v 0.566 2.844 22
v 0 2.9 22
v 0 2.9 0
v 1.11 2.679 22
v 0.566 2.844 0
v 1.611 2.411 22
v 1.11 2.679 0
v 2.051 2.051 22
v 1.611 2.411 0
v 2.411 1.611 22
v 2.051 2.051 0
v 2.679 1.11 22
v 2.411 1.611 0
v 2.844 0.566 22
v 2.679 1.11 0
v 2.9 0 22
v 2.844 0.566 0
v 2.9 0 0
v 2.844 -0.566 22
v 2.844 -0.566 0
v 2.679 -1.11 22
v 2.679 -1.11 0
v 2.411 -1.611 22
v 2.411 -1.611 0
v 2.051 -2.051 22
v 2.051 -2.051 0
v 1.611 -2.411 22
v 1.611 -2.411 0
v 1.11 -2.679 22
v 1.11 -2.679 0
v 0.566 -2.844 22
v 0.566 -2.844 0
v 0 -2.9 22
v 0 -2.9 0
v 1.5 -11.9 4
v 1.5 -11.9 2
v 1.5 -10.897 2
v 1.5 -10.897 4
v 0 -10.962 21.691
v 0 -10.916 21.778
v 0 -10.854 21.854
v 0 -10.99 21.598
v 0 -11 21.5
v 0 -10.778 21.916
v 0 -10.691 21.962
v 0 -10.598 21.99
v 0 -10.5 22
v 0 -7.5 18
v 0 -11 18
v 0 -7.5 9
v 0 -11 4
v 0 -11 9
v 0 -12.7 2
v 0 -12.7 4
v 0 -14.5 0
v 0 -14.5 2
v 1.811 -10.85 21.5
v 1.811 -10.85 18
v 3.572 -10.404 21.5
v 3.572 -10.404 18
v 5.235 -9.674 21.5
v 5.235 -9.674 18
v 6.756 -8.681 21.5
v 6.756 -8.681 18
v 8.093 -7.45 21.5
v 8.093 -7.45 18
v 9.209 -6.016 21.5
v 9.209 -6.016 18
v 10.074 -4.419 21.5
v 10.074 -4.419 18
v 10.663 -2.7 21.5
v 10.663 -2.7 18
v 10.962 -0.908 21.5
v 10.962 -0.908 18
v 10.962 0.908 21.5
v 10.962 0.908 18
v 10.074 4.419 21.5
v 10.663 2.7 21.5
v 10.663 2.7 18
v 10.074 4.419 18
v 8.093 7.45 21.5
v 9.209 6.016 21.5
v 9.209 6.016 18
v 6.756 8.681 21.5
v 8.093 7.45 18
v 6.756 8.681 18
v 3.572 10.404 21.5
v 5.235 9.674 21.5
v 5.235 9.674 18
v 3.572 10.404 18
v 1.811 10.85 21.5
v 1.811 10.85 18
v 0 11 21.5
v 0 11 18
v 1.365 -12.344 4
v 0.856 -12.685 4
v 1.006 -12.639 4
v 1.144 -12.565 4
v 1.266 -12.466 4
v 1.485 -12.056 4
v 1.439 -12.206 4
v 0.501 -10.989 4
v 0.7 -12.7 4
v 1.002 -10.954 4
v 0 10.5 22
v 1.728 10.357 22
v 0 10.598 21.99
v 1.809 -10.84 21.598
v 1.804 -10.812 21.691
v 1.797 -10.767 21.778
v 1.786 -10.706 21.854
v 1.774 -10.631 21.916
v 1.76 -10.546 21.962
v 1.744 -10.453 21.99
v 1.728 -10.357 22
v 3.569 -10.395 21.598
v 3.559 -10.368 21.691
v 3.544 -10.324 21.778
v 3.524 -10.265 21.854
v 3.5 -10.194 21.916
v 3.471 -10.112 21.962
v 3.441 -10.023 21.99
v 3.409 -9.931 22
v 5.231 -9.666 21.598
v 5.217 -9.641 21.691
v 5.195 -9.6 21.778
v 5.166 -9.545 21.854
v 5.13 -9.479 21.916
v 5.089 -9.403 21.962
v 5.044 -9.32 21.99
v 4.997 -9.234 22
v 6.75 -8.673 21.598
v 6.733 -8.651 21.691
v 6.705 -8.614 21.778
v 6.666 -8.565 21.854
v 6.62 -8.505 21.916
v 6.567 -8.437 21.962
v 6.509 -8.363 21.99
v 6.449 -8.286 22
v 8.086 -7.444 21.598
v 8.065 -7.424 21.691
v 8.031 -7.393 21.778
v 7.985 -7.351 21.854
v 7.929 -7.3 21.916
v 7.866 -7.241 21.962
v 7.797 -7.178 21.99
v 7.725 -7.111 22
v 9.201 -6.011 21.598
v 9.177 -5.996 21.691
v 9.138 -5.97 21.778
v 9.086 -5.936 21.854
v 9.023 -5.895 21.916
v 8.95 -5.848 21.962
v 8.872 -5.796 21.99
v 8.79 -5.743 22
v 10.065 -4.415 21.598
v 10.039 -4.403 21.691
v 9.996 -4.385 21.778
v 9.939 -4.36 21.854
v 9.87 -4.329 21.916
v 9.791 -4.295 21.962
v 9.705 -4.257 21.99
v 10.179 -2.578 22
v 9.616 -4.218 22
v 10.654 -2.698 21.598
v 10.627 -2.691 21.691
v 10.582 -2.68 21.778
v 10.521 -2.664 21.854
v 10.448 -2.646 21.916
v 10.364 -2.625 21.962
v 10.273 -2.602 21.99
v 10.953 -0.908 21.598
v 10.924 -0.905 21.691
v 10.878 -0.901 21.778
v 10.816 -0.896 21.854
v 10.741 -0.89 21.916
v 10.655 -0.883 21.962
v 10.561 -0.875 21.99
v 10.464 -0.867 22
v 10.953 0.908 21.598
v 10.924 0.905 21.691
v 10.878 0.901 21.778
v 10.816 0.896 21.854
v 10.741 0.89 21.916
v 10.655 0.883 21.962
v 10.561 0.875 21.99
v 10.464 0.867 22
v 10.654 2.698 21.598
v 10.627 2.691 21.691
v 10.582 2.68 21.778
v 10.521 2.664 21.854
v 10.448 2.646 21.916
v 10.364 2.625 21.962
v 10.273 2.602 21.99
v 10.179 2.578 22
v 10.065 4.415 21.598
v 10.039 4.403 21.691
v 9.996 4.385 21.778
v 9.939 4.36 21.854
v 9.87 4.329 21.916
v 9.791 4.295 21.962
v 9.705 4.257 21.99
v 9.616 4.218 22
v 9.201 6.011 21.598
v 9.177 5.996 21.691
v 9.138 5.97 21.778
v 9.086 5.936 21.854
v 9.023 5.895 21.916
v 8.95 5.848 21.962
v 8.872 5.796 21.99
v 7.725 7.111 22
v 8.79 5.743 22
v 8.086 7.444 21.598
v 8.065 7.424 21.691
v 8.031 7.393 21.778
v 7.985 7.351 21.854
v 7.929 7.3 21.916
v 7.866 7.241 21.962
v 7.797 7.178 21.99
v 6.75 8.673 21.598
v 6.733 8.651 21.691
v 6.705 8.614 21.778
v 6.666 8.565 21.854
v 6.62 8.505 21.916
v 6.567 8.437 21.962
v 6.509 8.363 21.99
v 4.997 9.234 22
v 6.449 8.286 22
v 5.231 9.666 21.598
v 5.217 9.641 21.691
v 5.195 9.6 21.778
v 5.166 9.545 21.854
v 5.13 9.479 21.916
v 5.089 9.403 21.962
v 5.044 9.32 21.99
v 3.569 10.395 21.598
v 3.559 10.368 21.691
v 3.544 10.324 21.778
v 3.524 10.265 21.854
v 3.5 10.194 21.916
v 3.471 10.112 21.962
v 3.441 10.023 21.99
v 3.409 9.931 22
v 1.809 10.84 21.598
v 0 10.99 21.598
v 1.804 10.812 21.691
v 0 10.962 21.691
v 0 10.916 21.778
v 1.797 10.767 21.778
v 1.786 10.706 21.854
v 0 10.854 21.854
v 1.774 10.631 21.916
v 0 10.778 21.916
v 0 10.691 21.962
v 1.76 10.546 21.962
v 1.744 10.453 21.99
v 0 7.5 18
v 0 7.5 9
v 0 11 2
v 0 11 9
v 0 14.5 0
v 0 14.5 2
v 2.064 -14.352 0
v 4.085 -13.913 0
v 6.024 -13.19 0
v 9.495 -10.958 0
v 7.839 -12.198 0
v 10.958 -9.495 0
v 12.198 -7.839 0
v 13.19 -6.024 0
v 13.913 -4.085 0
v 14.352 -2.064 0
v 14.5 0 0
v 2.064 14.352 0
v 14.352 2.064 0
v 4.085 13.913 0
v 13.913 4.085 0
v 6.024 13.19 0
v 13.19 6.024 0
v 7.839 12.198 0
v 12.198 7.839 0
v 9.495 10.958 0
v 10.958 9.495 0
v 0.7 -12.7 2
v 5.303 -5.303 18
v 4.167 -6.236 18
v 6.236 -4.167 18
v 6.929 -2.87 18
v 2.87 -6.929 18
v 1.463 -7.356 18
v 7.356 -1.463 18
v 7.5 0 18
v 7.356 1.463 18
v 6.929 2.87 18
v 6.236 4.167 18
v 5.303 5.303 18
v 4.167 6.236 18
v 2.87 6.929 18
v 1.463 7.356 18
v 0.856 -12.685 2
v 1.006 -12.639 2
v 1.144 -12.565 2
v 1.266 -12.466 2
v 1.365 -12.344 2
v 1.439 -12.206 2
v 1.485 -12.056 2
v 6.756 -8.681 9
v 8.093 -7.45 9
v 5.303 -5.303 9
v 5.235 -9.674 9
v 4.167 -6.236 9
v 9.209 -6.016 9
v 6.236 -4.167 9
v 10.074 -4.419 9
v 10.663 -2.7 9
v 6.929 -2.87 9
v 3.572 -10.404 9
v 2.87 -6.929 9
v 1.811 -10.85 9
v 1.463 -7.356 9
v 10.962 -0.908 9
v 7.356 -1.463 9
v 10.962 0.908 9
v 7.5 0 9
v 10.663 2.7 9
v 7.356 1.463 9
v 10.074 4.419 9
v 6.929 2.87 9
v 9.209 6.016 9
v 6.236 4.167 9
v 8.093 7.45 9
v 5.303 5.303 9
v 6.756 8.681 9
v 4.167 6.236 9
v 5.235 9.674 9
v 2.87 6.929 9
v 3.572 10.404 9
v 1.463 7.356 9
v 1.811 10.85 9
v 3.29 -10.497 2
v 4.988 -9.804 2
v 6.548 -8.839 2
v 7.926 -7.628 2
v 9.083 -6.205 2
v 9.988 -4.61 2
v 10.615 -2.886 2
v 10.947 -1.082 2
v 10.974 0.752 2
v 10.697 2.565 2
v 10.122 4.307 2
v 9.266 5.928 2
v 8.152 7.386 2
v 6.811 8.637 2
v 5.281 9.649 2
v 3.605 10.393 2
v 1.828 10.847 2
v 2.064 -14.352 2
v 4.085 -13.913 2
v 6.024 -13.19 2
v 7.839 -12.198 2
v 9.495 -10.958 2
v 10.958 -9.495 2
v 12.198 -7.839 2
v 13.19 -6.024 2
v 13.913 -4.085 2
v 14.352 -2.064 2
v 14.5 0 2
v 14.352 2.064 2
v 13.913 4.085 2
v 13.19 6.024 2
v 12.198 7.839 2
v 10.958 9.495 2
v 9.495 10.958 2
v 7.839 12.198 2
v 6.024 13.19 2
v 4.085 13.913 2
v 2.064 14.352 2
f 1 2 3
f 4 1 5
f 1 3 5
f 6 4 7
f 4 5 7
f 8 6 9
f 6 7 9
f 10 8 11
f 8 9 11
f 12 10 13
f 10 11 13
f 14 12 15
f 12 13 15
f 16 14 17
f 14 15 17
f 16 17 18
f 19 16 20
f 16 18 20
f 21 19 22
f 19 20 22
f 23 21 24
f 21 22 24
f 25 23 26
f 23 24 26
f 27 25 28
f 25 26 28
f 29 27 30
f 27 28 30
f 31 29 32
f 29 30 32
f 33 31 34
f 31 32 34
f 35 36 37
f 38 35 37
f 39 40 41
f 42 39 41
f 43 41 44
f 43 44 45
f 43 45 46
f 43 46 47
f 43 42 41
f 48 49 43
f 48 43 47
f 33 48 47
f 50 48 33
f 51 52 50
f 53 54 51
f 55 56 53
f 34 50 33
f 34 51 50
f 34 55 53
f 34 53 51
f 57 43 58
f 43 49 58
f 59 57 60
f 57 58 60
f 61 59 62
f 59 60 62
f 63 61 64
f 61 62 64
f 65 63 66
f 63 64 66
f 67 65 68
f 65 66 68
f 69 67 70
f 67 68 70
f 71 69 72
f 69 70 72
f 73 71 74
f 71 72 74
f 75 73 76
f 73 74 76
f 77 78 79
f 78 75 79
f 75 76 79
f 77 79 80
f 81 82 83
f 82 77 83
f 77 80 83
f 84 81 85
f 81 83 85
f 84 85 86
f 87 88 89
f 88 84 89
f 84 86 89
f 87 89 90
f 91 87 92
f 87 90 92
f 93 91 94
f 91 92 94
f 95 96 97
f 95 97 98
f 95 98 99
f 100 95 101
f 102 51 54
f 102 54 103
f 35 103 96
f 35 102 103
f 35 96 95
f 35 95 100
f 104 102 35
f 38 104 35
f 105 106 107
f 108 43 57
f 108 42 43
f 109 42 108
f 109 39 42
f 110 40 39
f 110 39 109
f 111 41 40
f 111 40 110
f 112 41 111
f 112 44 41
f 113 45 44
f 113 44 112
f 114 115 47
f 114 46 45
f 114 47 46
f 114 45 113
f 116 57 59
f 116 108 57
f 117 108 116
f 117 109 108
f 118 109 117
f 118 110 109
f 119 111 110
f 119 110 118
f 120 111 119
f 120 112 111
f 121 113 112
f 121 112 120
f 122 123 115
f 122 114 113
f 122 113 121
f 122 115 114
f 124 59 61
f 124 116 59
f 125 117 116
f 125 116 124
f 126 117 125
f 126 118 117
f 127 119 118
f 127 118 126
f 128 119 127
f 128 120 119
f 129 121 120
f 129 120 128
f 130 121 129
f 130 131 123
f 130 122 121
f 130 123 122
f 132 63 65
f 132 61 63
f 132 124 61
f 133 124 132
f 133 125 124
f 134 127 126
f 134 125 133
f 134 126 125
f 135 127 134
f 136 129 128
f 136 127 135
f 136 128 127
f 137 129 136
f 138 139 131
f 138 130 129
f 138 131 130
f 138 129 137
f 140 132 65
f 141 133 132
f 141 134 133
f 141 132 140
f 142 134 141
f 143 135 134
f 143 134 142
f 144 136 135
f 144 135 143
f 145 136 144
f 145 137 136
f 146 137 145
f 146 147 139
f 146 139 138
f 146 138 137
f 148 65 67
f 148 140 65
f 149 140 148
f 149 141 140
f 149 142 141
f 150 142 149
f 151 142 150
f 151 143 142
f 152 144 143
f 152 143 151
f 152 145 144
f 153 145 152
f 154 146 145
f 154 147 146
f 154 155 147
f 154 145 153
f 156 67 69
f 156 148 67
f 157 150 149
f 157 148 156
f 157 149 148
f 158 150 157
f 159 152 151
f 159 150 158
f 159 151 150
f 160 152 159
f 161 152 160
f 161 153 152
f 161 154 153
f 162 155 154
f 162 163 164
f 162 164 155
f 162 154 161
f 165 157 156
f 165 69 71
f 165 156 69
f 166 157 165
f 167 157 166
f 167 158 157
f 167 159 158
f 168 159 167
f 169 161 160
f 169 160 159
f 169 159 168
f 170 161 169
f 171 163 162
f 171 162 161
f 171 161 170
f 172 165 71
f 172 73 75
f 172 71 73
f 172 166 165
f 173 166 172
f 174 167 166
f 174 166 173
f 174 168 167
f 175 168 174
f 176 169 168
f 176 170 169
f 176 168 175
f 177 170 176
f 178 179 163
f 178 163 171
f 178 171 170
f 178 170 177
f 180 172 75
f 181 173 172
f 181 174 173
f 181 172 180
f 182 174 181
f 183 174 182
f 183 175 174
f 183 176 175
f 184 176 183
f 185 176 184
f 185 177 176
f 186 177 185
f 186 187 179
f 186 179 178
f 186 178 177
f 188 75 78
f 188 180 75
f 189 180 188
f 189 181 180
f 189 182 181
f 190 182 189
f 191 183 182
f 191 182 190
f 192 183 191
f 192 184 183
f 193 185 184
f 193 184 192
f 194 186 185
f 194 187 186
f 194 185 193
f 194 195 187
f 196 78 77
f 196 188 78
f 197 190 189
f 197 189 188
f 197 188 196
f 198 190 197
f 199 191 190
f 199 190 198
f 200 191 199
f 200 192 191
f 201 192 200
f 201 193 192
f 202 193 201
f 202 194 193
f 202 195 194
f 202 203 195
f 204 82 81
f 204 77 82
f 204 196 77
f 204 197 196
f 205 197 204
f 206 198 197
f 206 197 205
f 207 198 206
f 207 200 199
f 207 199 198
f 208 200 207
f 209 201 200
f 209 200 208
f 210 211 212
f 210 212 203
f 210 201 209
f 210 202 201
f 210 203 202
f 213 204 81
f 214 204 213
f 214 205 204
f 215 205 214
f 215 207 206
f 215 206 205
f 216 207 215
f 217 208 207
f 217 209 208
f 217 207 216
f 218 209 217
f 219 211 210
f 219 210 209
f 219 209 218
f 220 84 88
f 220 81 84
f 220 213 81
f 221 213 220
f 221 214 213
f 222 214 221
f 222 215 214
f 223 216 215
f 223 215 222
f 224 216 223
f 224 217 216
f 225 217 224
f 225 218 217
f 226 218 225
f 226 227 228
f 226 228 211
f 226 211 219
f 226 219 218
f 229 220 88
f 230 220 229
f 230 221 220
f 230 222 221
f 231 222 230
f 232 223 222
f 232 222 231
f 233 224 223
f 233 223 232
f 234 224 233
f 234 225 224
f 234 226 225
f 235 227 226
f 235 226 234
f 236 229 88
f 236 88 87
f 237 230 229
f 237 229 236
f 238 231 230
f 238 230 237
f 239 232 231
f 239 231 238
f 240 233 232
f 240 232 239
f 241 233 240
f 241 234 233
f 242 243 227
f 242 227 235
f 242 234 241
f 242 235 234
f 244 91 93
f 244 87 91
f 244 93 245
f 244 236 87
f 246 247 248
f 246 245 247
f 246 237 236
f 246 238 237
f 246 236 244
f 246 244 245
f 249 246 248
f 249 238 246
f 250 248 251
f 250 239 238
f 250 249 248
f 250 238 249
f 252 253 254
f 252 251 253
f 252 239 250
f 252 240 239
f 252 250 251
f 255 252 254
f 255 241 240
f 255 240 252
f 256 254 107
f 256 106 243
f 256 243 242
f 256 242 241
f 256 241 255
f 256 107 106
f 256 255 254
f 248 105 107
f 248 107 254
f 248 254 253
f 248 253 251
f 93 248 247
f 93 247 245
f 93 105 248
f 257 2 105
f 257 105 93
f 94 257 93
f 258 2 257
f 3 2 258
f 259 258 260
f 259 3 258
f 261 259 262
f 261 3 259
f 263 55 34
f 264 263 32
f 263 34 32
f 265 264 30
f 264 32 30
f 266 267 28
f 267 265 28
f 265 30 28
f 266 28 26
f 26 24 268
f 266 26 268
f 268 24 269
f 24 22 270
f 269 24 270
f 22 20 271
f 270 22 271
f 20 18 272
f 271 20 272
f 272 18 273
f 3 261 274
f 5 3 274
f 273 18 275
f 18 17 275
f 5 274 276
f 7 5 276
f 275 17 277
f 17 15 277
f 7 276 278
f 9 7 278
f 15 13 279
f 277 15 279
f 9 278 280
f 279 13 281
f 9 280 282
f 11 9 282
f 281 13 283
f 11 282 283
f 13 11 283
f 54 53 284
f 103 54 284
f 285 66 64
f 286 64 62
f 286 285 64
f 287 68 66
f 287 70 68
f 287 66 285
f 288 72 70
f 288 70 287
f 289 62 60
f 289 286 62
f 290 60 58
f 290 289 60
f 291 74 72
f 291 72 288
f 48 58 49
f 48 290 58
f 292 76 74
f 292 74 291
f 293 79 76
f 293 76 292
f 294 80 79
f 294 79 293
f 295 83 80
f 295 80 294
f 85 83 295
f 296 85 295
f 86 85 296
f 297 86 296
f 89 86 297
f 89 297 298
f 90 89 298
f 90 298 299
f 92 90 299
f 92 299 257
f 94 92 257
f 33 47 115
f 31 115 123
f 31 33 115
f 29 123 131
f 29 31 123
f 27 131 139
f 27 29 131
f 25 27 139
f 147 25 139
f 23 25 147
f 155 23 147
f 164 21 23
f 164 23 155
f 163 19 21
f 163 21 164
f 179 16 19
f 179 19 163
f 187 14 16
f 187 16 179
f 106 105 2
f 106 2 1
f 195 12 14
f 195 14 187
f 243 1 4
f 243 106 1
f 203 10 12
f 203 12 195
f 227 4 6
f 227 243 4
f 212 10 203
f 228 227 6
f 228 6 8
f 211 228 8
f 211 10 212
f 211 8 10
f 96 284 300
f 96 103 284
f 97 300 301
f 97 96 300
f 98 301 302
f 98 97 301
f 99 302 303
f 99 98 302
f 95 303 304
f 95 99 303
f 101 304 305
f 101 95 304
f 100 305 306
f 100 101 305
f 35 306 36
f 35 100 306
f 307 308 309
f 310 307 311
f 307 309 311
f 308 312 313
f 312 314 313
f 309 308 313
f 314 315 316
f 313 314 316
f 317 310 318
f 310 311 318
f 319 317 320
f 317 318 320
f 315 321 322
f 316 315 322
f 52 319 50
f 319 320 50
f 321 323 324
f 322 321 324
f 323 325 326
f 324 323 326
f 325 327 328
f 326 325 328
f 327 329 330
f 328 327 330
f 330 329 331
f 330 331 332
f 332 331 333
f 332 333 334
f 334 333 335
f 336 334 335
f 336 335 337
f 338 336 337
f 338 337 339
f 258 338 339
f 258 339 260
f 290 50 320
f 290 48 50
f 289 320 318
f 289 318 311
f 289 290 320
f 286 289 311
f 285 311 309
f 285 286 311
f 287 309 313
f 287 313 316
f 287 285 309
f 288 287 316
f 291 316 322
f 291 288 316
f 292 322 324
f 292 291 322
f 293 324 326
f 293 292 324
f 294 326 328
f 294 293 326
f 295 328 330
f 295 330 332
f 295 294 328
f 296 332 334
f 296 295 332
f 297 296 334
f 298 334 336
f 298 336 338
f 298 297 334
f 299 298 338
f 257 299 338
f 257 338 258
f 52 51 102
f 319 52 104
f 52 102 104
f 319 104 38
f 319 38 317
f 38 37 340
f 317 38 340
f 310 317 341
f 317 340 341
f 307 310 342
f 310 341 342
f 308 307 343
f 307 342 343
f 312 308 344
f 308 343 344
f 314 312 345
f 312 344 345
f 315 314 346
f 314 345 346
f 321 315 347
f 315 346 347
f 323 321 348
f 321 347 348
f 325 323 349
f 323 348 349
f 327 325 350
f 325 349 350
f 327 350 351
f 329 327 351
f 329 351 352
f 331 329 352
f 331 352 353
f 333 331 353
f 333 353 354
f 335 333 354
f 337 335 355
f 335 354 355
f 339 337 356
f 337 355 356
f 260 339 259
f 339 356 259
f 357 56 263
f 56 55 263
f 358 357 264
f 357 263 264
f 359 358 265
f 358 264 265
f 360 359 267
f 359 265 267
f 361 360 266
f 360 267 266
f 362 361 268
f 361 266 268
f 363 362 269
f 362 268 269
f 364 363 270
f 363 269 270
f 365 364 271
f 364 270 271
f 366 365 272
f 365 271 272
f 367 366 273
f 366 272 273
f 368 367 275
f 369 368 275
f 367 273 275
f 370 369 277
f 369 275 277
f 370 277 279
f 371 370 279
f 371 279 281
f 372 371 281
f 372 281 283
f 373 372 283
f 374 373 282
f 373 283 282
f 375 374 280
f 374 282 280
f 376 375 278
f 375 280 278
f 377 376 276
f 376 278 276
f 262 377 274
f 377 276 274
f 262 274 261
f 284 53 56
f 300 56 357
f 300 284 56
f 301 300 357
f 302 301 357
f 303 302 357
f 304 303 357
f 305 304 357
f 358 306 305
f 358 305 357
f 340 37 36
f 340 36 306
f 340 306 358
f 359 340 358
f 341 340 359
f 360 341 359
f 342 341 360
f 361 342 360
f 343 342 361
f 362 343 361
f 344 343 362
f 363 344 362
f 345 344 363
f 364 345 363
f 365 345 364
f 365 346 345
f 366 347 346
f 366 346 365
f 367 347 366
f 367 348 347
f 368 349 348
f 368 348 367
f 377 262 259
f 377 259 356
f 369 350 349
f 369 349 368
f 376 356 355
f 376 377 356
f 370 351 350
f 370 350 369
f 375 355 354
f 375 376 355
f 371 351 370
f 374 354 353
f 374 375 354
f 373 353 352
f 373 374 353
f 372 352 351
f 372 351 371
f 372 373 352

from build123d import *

# Parameters (mm, degrees)
F0_R      = 14.5
F1_DEPTH  = 2
F2_R      = 11
F3_DEPTH  = 20
F4_R      = 2.9
F5_DEPTH  = 22.001
F6_W      = 3
F6_H      = 3.4
F7_DEPTH  = 2
F8_R      = 0.8
F9_R      = 0.5
F11_W     = 28.85052
F11_H     = 54.144128
F12_DEPTH = 22.001
F14_W     = 3.5
F14_H     = 9


with BuildPart() as f1:
    # F0 (on Top) → F1 (new body)
    with BuildSketch(Plane.XY):
        Circle(F0_R)
    extrude(amount=F1_DEPTH)

    # F2 (on face) → F3 (join)
    with BuildSketch(Plane.XY.offset(2)):
        Circle(F2_R)
    extrude(amount=F3_DEPTH)

    # F4 (on face) → F5 (cut, through all)
    with BuildSketch(Plane(origin=(0, 0, 0), x_dir=(1, 0, 0), z_dir=(0, 0, -1))):
        Circle(F4_R)
    extrude(amount=-F5_DEPTH, mode=Mode.SUBTRACT)

    # F6 (on face) → F7 (join)
    with BuildSketch(Plane.XY.offset(2)):
        with Locations((0, -11)):
            Rectangle(F6_W, F6_H)
    extrude(amount=F7_DEPTH)

    # F8
    f8_edges = [f1.edges().sort_by_distance(p)[0] for p in [
        (-1.5, -12.7, 3),
        (1.5, -12.7, 3),
    ]]
    fillet(f8_edges, radius=F8_R)

    # F9
    f9_edges = [f1.edges().sort_by_distance(p)[0] for p in [
        (-11, 0, 22),
    ]]
    fillet(f9_edges, radius=F9_R)

    # F11 (on Top) → F12 (cut, through all)
    with BuildSketch(Plane.XY):
        with Locations((-14.42526, 2.568883)):
            Rectangle(F11_W, F11_H)
    extrude(amount=F12_DEPTH, mode=Mode.SUBTRACT)

    # F14 (on Front) → F15 (revolve, cut)
    with BuildSketch(Plane.XZ):
        with Locations((9.25, 13.5)):
            Rectangle(F14_W, F14_H)
    revolve(axis=Axis((0, 0, 13.307823), (0, 0, 1)), mode=Mode.SUBTRACT)


solid = f1.part
